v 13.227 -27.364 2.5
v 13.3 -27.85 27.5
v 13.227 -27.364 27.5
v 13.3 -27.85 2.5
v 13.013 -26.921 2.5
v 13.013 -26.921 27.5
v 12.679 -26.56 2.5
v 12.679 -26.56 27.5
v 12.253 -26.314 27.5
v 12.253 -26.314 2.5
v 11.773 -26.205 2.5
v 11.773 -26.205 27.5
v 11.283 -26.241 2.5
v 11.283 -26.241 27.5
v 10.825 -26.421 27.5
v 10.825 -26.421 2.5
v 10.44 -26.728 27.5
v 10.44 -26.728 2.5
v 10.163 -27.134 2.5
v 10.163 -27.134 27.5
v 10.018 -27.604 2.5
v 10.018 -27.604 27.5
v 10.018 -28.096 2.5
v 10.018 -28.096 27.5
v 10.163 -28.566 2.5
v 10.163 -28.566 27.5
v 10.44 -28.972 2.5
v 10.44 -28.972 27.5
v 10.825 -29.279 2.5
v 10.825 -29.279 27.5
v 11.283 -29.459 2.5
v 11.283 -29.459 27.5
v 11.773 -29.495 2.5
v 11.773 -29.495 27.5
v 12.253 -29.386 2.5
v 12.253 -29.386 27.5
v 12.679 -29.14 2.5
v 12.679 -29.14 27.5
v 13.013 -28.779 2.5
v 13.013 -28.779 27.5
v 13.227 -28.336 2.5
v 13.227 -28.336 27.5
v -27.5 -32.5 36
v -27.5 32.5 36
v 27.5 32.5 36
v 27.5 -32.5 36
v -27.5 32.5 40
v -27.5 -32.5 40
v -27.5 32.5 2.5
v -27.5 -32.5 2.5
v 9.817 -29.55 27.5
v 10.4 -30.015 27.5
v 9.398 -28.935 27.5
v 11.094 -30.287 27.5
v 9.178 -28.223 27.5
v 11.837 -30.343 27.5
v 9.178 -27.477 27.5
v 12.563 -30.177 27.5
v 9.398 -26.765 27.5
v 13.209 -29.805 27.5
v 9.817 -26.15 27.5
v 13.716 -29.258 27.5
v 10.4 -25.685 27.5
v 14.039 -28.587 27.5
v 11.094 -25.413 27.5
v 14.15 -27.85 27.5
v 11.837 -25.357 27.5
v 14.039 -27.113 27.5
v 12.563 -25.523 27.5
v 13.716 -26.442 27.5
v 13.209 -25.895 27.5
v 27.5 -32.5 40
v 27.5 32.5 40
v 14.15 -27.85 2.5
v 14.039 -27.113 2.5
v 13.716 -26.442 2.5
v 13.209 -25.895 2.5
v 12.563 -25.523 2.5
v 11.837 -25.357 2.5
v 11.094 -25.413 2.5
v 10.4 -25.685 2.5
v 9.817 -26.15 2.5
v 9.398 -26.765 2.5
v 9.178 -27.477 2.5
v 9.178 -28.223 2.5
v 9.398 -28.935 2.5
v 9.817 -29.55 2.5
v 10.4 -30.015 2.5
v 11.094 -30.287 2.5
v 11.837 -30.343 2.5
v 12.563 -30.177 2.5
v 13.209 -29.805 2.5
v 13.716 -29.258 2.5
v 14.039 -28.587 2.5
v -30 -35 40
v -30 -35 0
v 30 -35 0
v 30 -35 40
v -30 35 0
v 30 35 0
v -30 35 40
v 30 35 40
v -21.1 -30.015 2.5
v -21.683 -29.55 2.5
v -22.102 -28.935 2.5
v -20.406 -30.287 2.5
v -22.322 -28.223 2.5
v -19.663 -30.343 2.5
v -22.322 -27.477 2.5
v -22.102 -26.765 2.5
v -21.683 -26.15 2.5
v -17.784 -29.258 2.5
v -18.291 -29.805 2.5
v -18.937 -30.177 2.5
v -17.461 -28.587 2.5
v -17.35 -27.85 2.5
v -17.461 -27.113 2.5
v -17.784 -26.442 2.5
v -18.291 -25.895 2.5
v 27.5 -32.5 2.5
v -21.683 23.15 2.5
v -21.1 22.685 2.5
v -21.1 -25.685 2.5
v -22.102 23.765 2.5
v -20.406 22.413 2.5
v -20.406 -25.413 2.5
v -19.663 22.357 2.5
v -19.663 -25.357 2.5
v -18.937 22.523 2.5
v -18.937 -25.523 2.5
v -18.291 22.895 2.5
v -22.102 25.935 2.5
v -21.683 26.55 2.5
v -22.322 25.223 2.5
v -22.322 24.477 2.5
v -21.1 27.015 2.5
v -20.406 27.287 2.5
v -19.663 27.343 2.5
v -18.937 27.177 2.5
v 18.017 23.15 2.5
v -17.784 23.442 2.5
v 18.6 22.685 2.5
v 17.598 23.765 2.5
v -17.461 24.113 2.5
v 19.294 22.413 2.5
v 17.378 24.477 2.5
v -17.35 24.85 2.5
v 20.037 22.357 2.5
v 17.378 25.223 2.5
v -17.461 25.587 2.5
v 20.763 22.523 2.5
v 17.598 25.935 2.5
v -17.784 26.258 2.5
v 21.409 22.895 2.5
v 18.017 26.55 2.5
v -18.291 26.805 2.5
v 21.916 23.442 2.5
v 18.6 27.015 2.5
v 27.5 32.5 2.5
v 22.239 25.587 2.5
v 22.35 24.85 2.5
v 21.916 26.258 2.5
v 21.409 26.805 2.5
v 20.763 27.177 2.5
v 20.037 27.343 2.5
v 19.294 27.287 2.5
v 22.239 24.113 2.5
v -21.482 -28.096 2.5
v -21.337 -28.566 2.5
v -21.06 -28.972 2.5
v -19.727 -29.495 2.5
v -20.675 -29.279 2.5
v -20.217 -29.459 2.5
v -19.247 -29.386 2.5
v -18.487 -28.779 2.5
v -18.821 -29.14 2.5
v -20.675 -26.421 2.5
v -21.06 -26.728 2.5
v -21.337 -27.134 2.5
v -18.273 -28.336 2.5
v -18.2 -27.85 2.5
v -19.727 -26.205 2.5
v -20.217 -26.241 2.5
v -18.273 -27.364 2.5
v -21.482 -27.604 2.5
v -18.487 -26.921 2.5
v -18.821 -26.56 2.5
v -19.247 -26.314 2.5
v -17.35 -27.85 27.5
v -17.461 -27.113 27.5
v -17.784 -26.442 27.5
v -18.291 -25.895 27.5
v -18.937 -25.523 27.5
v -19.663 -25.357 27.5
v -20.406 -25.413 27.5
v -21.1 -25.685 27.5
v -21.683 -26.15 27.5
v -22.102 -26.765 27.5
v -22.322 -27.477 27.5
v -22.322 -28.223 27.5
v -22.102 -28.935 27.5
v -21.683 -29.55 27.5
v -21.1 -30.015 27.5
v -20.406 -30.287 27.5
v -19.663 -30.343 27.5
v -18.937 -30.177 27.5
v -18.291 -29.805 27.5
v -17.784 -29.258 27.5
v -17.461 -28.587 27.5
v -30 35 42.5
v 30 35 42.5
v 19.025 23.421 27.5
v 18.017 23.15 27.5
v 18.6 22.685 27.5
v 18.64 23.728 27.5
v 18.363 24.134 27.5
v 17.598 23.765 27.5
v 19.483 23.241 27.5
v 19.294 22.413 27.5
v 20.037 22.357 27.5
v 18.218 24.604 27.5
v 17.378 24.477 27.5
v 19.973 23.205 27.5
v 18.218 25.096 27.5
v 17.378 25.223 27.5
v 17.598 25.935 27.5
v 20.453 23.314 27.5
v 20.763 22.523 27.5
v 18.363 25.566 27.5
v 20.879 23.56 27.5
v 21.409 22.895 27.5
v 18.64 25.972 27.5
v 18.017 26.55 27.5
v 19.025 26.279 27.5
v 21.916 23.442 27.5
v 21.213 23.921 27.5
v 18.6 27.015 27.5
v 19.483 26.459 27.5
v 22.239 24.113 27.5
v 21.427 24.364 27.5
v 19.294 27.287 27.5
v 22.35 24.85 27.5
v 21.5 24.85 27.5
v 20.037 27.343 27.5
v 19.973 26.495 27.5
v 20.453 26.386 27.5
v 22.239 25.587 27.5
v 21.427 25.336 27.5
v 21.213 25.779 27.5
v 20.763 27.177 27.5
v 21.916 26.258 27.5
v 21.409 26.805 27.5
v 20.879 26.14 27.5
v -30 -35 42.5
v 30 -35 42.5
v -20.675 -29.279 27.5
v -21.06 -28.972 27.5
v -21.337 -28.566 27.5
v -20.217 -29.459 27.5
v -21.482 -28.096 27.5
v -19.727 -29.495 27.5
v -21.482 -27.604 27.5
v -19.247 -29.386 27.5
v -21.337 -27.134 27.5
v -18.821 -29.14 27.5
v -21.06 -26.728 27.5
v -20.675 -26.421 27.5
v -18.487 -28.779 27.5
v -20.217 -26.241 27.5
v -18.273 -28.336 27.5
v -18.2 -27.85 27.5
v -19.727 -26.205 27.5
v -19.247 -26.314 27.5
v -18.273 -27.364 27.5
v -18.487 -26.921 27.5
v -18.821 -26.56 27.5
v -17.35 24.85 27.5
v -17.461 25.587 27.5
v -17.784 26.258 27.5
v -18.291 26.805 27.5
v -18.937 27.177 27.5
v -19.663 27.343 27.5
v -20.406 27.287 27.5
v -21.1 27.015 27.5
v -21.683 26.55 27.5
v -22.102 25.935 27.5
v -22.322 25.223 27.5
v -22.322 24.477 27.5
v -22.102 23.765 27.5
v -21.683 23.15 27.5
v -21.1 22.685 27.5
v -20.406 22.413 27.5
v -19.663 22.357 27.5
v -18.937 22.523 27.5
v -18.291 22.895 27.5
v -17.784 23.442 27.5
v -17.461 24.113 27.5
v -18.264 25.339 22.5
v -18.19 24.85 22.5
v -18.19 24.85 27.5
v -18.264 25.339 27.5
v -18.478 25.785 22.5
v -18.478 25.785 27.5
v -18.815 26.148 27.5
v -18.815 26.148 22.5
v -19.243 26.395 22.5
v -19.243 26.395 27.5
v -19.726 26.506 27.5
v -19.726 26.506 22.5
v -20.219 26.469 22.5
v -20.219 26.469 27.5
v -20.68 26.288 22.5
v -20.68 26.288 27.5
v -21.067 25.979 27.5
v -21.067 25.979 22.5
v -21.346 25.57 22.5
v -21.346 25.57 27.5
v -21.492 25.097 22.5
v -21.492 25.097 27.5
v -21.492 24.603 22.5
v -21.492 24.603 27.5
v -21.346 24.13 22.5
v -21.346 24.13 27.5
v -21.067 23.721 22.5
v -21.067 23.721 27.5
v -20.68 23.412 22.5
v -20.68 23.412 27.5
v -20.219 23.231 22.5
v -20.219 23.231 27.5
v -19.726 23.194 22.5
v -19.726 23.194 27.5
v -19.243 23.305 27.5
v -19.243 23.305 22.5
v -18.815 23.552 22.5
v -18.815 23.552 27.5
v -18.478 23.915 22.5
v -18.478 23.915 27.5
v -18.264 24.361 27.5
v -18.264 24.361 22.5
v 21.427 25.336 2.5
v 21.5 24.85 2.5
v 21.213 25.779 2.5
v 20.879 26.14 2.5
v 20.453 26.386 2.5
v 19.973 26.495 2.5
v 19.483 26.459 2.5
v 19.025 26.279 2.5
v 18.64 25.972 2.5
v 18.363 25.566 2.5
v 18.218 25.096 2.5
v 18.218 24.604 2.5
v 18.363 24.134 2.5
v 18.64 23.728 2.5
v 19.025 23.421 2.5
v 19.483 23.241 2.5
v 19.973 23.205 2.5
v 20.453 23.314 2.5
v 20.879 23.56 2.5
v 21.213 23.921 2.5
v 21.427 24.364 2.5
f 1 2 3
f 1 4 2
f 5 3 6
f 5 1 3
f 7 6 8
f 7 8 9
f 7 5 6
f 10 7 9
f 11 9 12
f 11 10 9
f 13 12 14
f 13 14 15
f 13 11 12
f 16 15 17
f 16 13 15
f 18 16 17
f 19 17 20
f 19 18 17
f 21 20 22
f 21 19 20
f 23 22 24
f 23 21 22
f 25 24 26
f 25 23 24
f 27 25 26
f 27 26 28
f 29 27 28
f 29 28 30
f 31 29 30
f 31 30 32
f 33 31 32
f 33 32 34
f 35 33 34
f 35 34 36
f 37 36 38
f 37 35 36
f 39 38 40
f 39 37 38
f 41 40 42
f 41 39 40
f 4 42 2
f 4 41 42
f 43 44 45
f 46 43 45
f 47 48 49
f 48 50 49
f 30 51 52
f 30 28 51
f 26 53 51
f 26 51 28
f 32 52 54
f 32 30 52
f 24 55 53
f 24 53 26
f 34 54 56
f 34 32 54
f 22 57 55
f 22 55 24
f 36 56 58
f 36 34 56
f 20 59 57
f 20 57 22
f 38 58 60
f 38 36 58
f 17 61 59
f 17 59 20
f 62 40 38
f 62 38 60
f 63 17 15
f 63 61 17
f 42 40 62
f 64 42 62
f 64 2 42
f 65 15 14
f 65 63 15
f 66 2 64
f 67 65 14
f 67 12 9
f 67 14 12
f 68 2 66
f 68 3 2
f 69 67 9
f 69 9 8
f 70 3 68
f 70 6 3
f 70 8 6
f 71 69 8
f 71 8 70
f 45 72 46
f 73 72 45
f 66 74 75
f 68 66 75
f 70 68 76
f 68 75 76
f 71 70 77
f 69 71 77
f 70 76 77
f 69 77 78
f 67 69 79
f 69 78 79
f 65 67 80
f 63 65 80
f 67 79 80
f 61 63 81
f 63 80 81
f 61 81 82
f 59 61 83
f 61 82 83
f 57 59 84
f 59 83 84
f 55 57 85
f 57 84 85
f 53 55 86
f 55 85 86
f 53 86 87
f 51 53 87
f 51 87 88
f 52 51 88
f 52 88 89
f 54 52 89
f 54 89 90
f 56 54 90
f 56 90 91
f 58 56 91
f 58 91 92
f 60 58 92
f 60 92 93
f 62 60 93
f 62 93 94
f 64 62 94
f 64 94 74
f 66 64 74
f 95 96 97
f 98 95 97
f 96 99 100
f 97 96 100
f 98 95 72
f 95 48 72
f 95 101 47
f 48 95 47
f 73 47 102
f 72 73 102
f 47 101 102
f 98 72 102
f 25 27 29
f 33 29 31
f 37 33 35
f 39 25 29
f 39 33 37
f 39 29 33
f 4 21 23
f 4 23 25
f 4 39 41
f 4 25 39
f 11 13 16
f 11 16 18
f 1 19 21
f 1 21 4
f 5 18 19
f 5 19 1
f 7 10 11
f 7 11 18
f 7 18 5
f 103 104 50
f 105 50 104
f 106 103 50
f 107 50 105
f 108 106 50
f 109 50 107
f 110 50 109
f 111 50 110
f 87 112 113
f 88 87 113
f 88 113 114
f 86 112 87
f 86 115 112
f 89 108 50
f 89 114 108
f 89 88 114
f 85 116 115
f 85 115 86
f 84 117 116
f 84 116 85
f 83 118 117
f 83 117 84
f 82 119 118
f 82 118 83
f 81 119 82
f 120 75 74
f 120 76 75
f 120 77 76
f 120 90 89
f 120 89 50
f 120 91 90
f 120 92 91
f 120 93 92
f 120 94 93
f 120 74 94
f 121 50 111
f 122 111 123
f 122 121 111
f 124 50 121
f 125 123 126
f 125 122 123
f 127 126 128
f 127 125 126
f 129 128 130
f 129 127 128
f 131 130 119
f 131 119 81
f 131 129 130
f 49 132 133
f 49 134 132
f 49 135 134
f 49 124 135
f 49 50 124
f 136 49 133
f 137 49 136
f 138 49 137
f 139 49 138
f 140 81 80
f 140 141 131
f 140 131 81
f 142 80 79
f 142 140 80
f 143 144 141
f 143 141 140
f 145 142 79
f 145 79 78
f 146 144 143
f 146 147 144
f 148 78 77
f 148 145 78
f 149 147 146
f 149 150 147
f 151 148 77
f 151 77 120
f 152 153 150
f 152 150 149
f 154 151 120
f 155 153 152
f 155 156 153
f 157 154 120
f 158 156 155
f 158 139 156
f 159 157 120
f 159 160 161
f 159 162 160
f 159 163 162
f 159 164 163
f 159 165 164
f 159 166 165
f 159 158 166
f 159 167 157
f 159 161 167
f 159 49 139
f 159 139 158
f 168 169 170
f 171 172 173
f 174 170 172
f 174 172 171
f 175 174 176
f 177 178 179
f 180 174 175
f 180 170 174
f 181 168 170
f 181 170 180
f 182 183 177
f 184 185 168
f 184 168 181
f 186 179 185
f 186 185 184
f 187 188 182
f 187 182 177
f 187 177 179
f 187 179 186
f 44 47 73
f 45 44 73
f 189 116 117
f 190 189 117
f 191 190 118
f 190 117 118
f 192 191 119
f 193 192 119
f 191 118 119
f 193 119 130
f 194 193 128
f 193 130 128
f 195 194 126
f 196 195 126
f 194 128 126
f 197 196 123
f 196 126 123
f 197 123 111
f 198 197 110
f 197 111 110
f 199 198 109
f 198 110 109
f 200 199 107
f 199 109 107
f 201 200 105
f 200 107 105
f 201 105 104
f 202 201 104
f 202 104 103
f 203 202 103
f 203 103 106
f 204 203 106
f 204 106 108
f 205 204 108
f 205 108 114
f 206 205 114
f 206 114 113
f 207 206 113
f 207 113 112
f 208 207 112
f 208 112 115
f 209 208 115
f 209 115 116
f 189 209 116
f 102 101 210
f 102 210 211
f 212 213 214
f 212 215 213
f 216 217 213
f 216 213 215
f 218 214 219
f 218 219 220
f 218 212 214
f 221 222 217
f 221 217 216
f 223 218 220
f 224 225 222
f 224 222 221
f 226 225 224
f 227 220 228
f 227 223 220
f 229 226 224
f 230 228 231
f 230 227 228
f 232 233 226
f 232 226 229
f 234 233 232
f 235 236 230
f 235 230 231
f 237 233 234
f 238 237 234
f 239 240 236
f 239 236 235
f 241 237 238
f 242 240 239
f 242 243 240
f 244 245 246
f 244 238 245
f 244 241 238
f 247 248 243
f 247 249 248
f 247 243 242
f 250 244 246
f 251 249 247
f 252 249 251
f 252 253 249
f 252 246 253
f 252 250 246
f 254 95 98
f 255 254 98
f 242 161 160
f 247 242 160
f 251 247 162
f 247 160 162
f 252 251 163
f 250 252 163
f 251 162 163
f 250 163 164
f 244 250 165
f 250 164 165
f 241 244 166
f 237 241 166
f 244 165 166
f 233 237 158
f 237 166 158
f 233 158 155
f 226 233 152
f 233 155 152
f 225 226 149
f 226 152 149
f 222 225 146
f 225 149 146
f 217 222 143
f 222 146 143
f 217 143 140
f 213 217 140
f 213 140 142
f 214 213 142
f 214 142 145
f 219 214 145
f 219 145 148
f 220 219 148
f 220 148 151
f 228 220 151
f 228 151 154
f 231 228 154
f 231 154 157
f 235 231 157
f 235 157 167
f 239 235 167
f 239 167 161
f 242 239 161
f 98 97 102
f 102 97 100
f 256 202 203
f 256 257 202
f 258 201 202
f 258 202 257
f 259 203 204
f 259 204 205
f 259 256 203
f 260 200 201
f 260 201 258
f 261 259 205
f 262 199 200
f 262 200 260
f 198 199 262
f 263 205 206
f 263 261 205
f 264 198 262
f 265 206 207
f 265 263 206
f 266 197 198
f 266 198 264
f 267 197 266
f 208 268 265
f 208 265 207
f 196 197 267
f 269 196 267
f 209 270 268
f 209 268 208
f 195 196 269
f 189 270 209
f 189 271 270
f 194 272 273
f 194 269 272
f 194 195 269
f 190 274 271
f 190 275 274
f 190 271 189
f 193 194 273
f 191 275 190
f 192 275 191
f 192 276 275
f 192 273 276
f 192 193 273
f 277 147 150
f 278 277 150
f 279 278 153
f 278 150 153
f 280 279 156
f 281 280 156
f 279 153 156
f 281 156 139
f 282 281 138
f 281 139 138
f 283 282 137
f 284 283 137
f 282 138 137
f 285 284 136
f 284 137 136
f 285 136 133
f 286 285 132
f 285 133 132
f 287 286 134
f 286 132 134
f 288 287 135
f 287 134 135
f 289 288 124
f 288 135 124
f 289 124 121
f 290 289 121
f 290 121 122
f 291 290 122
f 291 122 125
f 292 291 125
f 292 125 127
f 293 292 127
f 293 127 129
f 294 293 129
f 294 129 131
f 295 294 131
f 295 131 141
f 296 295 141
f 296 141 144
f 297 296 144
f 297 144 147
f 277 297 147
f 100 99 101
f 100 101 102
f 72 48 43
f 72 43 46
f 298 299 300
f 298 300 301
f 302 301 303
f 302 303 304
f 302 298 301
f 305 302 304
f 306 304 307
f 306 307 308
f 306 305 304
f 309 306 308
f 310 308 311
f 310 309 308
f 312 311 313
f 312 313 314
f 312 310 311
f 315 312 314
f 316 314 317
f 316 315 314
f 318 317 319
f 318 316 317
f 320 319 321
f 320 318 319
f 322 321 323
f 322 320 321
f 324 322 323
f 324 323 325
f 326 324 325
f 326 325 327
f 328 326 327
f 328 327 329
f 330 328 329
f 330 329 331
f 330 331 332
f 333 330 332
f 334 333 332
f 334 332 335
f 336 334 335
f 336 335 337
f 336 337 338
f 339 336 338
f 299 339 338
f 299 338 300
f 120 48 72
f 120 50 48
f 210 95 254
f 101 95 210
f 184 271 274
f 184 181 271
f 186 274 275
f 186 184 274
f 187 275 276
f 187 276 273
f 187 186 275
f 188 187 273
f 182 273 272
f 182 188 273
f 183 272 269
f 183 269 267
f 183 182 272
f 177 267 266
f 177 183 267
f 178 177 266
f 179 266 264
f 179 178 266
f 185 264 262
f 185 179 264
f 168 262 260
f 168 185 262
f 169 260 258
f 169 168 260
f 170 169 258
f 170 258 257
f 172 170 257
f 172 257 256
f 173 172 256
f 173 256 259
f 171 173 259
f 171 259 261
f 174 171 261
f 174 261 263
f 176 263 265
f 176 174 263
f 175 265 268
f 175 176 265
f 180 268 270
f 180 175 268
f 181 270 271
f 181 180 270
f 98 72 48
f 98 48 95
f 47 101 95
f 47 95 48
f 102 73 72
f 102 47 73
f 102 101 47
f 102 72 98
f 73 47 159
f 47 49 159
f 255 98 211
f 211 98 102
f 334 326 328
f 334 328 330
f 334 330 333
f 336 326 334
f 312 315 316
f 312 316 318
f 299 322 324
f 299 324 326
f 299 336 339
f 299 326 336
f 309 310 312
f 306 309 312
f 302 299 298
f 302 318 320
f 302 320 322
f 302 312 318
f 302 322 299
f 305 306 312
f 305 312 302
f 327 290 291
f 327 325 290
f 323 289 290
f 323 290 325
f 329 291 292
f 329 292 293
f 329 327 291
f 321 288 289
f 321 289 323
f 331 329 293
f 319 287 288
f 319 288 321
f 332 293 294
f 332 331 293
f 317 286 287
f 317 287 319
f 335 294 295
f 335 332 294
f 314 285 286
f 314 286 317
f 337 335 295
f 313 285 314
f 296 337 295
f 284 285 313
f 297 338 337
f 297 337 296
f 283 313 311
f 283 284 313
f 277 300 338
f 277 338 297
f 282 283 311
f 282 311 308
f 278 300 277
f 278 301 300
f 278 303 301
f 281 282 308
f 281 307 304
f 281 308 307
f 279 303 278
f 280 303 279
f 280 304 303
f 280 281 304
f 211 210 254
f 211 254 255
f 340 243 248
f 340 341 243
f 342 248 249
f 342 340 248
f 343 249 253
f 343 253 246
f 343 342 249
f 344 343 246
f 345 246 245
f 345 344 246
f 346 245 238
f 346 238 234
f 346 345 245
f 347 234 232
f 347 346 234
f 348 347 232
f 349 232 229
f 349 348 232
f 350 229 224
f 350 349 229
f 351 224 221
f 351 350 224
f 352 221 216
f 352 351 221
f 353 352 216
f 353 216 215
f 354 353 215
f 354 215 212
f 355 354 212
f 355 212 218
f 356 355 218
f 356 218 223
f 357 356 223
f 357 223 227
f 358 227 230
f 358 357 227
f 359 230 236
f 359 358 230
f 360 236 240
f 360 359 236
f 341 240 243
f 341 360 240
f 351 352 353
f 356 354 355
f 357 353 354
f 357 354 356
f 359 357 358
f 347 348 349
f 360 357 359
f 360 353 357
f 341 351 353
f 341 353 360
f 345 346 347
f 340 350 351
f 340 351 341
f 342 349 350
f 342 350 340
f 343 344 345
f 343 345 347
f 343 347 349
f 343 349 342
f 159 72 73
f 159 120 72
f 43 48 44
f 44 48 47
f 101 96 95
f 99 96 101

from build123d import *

# Parameters (mm, degrees)
F0_W      = 60
F0_H      = 70
F1_DEPTH  = 40
F2_T      = -2.5
F3_W      = 60
F3_H      = 70
F3_W_2    = 55
F3_H_2    = 65
F4_DEPTH  = 2.5
F5_DEPTH  = 4
F6_R      = 2.5
F6_R_2    = 1.6602380345
F6_R_3    = 1.65
F7_DEPTH  = 25
F7_FACE_R = 1.6602380345
F8_DEPTH  = 20


with BuildPart() as f1:
    # F0 (on Top) → F1 (new body)
    with BuildSketch(Plane.XY):
        Rectangle(F0_W, F0_H)
    extrude(amount=F1_DEPTH)

    # F2
    f2_openings = [f1.faces().sort_by_distance(p)[0] for p in [
        (0, 0, 40),
    ]]
    offset(amount=F2_T, openings=f2_openings)

    # F6 (on face) → F7 (join)
    with BuildSketch(Plane.XY.offset(2.5)):
        with Locations((-19.85, 24.85)):
            Circle(F6_R)
        with Locations((-19.85, 24.85)):
            Circle(F6_R_2, mode=Mode.SUBTRACT)
        with Locations((19.85, 24.85)):
            Circle(F6_R)
        with Locations((19.85, 24.85)):
            Circle(F6_R_3, mode=Mode.SUBTRACT)
        with Locations((-19.85, -27.85)):
            Circle(F6_R)
        with Locations((-19.85, -27.85)):
            Circle(F6_R_3, mode=Mode.SUBTRACT)
        with Locations((11.65, -27.85)):
            Circle(F6_R)
        with Locations((11.65, -27.85)):
            Circle(F6_R_3, mode=Mode.SUBTRACT)
    extrude(amount=F7_DEPTH)

    # F6 (on face) + F7_face (on face) → F8 (join)
    with BuildSketch(Plane.XY.offset(2.5)):
        with Locations((-19.85, 24.85)):
            Circle(F6_R)
        with Locations((-19.85, 24.85)):
            Circle(F6_R_2, mode=Mode.SUBTRACT)
        with Locations((19.85, 24.85)):
            Circle(F6_R)
        with Locations((19.85, 24.85)):
            Circle(F6_R_3, mode=Mode.SUBTRACT)
        with Locations((-19.85, -27.85)):
            Circle(F6_R)
        with Locations((-19.85, -27.85)):
            Circle(F6_R_3, mode=Mode.SUBTRACT)
        with Locations((11.65, -27.85)):
            Circle(F6_R)
        with Locations((11.65, -27.85)):
            Circle(F6_R_3, mode=Mode.SUBTRACT)
    with BuildSketch(Plane(origin=(-19.85, 24.85, 2.5), x_dir=(1, 0, 0), z_dir=(0, 0, 1))):
        Circle(F7_FACE_R)
    extrude(amount=F8_DEPTH)


with BuildPart() as f4:
    # F3 (on face) → F4 (new body)
    with BuildSketch(Plane.XY.offset(40)):
        Rectangle(F3_W, F3_H)
        Rectangle(F3_W_2, F3_H_2, mode=Mode.SUBTRACT)
        Rectangle(F3_W_2, F3_H_2)
    extrude(amount=F4_DEPTH)

    # F3 (on face) → F5 (join)
    with BuildSketch(Plane.XY.offset(40)):
        Rectangle(F3_W_2, F3_H_2)
    extrude(amount=-F5_DEPTH)


solid = Compound([f1.part, f4.part])
